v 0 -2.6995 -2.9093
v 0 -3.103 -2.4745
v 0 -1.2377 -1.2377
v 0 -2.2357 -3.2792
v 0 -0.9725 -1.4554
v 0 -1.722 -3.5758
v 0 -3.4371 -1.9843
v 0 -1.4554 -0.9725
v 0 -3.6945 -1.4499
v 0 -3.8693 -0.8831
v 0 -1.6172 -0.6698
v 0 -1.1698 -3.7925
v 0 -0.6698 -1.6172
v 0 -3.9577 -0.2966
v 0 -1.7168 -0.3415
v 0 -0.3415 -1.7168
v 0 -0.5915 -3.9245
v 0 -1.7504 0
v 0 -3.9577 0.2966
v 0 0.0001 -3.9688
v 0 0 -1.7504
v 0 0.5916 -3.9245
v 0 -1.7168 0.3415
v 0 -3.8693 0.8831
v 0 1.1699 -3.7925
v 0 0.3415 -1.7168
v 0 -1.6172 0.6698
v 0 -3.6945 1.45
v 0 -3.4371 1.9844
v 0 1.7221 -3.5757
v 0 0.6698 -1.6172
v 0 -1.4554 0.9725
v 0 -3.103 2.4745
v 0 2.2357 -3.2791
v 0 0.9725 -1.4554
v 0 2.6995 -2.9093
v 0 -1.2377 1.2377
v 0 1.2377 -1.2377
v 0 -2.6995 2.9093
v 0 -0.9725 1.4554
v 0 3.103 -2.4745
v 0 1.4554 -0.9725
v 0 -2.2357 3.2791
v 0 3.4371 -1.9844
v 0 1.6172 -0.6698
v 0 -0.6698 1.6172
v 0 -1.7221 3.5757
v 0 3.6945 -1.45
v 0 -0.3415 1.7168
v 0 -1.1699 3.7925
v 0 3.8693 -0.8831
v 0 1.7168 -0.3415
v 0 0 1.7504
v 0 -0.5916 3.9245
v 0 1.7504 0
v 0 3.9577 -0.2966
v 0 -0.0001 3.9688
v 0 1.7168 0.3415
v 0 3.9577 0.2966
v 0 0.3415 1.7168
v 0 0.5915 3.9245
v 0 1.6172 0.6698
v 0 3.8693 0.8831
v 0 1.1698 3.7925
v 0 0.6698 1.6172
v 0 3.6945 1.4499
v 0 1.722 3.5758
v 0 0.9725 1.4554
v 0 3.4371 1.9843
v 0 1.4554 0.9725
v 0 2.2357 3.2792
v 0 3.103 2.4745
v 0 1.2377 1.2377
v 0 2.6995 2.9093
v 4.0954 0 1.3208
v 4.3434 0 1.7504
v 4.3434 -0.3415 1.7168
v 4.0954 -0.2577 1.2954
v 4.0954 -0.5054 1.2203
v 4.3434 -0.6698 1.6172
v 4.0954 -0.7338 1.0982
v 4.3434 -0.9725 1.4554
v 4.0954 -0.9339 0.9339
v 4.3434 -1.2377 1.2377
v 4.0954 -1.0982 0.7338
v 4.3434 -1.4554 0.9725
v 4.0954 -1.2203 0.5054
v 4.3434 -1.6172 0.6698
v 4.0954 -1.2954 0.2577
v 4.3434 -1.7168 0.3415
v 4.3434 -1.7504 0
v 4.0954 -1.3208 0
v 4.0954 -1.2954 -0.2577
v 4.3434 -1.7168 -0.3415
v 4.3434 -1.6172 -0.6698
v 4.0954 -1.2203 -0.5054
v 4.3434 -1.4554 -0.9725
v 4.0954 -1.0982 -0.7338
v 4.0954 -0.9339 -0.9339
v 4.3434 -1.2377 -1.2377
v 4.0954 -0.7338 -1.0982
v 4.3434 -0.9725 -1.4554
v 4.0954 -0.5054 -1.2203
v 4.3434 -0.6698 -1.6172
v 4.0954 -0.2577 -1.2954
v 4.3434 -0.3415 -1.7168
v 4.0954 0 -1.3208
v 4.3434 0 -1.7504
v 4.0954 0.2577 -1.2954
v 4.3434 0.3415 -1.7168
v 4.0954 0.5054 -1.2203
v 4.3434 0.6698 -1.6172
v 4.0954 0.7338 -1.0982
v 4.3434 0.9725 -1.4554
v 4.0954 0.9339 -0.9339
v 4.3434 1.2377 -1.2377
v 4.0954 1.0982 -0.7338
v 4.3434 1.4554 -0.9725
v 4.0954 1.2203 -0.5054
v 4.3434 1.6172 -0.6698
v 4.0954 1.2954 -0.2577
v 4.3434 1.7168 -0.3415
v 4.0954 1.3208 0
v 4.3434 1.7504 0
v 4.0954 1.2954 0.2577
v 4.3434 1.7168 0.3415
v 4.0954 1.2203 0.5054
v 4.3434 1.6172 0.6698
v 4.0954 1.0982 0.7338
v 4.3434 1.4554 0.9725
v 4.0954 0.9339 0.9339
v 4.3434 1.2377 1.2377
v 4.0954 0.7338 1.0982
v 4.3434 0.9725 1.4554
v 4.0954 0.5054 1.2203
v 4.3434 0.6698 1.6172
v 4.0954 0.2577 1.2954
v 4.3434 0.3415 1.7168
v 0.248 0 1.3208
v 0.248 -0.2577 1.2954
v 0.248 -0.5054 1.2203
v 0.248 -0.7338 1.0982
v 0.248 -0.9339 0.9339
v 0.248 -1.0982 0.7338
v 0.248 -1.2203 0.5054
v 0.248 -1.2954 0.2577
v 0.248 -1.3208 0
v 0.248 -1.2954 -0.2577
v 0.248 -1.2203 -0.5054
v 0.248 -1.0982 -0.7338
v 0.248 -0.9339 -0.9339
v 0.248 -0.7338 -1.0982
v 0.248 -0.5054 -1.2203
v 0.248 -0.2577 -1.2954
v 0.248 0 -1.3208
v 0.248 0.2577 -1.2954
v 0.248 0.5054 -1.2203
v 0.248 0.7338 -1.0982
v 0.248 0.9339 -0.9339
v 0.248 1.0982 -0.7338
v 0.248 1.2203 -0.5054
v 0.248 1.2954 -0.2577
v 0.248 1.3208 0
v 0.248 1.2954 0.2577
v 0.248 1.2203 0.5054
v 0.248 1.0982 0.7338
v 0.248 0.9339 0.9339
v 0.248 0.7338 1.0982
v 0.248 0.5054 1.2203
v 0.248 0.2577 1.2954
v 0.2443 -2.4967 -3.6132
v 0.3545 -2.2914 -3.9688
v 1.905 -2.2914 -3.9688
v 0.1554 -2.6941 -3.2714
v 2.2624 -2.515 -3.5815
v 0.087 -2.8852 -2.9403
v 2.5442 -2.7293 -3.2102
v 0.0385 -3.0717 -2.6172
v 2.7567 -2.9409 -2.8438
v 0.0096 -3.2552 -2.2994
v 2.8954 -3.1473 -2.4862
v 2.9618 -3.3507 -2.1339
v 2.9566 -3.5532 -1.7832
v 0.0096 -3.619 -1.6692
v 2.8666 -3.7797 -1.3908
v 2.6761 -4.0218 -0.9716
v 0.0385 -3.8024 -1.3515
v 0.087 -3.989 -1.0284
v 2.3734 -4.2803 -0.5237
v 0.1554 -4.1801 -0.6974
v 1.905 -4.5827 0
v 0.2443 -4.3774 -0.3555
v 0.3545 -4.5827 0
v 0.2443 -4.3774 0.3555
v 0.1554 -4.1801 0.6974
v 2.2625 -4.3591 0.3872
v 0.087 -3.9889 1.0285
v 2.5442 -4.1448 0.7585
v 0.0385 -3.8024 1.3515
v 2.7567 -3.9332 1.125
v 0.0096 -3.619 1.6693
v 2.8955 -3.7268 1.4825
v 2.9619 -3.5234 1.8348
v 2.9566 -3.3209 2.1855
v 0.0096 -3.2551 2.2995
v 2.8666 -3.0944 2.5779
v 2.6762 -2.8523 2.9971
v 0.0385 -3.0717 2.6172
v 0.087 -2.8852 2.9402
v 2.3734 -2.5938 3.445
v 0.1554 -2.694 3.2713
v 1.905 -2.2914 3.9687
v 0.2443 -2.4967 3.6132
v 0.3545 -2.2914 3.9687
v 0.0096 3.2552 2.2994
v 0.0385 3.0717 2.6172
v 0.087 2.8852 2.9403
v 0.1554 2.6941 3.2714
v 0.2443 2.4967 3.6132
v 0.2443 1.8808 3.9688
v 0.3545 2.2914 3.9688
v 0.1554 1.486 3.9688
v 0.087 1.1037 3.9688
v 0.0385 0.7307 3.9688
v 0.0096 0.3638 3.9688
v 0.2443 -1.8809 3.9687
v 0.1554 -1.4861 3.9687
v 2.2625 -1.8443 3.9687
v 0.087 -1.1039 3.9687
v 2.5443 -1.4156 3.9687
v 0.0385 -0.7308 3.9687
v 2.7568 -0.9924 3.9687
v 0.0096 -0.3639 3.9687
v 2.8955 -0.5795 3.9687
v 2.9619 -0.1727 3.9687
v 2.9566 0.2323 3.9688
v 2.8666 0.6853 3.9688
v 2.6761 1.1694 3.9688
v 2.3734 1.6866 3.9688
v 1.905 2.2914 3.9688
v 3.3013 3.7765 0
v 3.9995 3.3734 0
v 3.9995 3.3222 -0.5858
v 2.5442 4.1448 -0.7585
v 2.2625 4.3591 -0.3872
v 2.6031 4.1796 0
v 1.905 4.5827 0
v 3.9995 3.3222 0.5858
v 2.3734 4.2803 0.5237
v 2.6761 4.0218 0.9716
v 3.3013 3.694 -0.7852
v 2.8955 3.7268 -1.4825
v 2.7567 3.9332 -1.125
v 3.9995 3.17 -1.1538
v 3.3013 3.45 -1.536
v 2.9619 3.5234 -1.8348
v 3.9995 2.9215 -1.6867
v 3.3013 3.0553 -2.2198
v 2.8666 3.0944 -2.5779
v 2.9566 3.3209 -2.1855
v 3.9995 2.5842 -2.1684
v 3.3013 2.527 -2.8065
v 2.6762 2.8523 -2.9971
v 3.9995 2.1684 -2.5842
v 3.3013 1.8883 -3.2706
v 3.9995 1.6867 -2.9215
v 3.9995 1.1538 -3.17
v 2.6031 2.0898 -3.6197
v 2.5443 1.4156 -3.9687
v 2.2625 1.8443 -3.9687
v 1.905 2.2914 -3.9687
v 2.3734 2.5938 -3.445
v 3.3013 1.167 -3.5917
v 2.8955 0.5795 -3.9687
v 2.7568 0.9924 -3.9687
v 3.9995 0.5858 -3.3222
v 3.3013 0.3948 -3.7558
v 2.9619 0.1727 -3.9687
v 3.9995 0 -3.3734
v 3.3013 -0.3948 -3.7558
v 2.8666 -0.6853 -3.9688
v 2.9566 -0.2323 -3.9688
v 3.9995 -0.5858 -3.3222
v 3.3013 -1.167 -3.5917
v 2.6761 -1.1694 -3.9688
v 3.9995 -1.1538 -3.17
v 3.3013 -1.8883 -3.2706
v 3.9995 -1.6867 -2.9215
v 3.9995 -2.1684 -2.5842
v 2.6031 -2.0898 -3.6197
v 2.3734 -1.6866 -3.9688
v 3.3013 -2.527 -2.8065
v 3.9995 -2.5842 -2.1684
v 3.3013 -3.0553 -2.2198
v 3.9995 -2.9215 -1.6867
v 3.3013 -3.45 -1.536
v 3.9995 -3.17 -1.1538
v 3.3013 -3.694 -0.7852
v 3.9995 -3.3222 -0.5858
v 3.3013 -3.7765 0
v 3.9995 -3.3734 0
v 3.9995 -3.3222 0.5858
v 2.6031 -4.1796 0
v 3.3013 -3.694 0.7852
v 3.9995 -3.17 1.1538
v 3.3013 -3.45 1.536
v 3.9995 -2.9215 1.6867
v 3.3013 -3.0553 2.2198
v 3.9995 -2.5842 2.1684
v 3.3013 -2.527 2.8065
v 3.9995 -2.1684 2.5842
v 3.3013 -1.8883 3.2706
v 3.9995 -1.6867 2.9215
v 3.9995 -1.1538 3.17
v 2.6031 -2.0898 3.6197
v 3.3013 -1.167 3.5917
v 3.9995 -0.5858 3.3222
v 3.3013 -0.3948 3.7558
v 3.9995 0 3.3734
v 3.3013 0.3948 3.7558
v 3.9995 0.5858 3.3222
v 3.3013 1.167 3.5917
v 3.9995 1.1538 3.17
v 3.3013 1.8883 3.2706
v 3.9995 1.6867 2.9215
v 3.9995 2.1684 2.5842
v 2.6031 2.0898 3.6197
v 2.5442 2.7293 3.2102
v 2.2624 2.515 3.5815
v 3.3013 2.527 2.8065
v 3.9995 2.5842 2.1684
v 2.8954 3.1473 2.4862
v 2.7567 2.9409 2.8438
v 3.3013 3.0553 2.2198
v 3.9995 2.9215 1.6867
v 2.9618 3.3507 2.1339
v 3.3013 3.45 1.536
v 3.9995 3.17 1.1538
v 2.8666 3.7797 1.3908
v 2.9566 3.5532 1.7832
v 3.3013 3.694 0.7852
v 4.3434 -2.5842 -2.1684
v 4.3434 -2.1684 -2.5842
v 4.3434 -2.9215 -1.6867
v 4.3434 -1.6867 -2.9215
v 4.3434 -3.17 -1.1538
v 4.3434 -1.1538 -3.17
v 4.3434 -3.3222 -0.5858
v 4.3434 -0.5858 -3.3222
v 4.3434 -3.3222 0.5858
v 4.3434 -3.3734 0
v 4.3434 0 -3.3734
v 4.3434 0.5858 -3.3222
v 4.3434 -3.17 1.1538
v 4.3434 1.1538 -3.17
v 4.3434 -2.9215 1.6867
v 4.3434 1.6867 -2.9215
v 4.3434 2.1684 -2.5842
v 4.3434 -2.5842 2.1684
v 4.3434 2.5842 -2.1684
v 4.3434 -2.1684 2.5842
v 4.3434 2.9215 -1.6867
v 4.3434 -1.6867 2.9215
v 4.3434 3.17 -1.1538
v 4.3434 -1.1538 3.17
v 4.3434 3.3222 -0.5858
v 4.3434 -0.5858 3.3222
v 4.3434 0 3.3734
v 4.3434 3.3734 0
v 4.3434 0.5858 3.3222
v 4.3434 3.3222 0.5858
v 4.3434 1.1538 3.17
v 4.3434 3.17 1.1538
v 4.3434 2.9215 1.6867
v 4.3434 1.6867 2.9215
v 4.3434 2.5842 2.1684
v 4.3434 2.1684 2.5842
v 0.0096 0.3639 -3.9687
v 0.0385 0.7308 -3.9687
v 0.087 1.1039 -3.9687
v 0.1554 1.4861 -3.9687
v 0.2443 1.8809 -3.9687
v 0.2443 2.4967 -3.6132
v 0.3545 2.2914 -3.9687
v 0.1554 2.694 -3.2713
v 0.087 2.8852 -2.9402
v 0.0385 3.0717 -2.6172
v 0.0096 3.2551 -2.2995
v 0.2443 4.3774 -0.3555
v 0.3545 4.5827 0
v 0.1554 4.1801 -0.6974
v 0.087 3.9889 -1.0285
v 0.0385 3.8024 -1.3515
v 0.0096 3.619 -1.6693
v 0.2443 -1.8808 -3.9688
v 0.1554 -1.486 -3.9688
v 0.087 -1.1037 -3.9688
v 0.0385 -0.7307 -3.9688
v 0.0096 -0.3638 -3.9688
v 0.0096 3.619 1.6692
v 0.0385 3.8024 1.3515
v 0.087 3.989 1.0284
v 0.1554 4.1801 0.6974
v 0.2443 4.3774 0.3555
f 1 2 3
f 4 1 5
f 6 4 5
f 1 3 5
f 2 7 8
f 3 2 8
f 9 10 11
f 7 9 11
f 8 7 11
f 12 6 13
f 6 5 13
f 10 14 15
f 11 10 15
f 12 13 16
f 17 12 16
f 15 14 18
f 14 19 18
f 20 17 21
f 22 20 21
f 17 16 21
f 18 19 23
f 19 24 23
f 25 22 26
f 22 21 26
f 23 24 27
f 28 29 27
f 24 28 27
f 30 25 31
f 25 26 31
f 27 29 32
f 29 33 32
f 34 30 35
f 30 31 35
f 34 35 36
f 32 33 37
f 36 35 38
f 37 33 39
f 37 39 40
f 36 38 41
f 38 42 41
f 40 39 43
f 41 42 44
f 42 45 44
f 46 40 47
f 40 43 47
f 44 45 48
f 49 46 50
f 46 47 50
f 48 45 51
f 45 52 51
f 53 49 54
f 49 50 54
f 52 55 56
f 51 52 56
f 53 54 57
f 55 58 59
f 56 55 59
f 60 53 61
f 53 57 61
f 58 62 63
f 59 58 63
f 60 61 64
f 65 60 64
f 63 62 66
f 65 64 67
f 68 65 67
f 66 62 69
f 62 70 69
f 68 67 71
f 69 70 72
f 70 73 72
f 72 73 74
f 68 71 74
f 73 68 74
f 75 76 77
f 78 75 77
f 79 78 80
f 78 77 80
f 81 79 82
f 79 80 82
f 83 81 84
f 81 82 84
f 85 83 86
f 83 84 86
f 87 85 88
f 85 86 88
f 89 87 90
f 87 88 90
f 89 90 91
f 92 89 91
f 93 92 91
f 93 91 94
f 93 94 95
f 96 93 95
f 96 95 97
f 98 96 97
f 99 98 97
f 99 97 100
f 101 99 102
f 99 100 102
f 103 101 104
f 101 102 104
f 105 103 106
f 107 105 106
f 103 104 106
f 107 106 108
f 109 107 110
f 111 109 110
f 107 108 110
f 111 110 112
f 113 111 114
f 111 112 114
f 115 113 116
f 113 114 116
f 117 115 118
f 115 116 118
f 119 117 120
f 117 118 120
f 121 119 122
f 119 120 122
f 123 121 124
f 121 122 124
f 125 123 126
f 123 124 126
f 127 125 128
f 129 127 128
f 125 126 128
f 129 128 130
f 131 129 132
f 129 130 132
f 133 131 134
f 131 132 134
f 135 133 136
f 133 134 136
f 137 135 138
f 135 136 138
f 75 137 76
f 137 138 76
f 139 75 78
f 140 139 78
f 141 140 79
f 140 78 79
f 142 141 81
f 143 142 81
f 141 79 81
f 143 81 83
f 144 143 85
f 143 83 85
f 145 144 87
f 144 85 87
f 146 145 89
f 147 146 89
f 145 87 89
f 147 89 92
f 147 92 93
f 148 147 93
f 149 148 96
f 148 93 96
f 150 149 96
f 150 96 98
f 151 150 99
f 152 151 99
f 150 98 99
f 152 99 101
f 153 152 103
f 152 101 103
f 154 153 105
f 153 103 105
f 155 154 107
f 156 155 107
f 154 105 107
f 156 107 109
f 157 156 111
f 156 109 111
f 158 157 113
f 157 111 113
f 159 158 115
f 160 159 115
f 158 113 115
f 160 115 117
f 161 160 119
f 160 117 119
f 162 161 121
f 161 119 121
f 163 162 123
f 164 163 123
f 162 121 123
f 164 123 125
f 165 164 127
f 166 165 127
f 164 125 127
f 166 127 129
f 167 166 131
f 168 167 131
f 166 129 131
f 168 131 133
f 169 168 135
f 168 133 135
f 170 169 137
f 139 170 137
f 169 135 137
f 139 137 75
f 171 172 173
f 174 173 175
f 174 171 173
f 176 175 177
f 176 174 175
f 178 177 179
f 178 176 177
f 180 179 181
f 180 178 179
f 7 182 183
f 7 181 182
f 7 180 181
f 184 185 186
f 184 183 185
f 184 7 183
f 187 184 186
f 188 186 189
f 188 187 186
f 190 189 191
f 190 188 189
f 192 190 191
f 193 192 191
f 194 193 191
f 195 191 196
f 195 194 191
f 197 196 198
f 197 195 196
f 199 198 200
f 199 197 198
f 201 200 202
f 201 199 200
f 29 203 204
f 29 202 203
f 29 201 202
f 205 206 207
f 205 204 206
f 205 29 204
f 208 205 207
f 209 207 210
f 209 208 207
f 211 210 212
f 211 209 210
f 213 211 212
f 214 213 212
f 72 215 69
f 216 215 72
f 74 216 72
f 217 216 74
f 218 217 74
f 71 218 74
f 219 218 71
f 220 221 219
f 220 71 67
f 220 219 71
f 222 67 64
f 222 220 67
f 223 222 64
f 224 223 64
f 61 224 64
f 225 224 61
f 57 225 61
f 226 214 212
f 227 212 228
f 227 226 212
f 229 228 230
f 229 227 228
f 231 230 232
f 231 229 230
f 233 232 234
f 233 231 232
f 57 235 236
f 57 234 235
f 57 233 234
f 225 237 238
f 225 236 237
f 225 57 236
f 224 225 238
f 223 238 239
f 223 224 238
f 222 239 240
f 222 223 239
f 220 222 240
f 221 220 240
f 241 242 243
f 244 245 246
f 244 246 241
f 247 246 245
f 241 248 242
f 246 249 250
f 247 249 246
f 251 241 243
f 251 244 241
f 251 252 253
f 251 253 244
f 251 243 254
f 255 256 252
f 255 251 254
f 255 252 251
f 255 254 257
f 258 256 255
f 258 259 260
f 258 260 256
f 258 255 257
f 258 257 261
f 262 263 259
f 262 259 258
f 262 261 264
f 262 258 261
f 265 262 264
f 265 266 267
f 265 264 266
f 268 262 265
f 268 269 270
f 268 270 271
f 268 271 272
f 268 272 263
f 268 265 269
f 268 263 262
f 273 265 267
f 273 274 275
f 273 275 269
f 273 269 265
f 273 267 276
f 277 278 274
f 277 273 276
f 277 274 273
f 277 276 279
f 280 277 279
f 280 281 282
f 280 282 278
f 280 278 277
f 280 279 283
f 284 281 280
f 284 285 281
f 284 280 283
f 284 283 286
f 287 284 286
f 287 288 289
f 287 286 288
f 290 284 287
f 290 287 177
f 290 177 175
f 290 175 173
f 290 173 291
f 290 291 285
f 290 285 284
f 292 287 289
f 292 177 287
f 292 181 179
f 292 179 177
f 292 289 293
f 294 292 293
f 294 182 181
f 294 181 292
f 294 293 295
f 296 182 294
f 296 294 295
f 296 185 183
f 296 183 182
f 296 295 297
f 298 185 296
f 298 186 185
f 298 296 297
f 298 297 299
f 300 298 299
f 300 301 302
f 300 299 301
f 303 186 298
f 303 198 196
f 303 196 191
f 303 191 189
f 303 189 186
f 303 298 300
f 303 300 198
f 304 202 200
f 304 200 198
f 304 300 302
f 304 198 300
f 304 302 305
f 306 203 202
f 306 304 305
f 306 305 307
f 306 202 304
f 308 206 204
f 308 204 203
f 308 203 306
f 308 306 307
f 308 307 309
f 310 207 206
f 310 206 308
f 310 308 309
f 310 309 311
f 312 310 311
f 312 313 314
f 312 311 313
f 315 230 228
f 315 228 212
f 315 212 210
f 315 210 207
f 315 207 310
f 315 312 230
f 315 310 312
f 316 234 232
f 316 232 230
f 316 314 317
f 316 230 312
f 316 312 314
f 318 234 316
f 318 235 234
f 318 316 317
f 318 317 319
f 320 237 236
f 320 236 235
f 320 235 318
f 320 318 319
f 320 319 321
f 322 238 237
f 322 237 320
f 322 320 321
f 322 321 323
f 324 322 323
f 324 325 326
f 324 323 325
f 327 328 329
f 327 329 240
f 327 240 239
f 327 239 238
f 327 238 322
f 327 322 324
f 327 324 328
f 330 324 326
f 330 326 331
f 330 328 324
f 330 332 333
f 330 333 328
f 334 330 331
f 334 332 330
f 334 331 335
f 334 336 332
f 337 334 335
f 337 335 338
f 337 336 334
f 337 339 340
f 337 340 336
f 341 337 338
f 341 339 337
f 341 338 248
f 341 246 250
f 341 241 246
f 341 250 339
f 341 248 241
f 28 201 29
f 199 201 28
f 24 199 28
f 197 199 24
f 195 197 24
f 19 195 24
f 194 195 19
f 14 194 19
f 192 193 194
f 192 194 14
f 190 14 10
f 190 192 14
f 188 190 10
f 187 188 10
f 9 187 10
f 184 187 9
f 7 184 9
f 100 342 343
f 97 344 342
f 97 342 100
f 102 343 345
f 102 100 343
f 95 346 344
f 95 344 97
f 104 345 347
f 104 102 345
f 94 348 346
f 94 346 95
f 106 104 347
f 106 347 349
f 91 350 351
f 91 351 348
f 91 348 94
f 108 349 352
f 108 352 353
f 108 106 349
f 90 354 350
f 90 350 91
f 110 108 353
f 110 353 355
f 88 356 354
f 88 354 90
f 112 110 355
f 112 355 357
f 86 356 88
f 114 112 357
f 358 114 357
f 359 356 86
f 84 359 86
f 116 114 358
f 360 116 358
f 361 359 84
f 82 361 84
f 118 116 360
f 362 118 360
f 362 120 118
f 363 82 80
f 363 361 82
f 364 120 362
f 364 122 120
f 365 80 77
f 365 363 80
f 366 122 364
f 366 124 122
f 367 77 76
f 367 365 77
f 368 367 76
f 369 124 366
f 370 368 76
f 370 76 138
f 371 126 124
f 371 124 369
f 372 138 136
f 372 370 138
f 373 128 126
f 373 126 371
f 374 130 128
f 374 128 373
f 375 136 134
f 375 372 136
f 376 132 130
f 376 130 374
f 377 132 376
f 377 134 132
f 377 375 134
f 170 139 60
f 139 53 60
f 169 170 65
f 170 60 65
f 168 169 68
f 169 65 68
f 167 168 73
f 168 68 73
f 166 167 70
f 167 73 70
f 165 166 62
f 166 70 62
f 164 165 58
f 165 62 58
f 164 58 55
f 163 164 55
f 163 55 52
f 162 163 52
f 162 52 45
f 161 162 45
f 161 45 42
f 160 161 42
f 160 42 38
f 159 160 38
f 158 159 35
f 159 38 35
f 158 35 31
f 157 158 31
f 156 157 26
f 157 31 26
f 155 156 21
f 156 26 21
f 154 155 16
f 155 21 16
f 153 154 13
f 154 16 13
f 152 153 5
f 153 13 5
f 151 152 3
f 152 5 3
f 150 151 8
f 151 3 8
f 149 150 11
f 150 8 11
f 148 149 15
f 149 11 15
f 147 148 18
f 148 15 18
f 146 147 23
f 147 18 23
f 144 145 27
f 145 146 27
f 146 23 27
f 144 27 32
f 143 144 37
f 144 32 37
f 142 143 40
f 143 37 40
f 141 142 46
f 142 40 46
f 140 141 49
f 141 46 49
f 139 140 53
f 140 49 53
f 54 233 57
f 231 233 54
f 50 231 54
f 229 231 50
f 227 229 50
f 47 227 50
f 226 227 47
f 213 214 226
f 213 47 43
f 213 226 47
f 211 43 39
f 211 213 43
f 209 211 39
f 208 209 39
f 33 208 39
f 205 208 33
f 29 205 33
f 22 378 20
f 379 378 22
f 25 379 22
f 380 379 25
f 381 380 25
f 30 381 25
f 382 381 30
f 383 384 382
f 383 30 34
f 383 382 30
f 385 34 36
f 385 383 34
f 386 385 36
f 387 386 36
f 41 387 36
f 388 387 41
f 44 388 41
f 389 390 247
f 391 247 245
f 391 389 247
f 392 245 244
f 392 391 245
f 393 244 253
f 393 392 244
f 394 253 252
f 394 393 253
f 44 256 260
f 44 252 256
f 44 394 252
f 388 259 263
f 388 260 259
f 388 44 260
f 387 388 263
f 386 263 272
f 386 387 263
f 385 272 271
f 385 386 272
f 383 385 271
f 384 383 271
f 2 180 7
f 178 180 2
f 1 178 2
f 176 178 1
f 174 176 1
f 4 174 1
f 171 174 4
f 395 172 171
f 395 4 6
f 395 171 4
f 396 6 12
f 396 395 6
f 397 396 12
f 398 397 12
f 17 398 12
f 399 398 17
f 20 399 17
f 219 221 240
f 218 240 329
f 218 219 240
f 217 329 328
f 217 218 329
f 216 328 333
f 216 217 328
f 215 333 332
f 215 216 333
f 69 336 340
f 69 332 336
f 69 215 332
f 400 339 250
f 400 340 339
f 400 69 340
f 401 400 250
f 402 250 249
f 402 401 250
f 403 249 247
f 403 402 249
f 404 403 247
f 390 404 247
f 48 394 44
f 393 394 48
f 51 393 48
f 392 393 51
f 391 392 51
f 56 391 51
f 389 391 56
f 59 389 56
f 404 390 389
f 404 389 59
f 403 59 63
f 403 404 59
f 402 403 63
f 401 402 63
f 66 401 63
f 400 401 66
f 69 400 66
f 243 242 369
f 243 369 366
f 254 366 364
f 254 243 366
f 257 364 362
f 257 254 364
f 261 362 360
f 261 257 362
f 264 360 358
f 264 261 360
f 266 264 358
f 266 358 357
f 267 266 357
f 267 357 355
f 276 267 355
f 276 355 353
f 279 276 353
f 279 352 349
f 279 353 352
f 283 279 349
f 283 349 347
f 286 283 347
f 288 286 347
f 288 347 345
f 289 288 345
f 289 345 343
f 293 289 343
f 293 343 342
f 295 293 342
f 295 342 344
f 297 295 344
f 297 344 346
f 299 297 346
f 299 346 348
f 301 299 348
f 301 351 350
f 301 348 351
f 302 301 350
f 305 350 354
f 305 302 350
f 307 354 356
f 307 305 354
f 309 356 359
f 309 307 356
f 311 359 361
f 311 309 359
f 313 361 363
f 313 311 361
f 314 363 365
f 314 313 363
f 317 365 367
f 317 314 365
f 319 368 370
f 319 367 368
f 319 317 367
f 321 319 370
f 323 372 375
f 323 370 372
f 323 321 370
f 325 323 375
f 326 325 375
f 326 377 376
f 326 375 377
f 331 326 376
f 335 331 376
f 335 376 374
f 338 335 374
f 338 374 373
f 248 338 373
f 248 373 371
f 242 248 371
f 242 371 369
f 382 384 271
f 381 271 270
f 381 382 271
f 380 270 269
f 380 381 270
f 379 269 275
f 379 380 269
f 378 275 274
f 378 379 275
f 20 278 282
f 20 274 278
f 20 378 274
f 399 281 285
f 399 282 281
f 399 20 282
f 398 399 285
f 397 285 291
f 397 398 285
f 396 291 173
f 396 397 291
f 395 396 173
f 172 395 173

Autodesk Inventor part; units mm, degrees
ref_plane "YZ Plane" through (0, 0, 0) normal (1, 0, 0) x (0, 1, 0)
ref_plane "XZ Plane" through (0, 0, 0) normal (0, 1, 0) x (-1, 0, 0)
sketch "Sketch1" plane through (0, 0, 0) normal (1, 0, 0) x (0, 1, 0)
  line L0 (-4.5827, 0) -> (-2.2914, 3.9687)
  line L1 (-2.2914, 3.9687) -> (2.2914, 3.9688)
  line L2 (2.2914, 3.9688) -> (4.5827, 0)
  line L3 (4.5827, 0) -> (2.2914, -3.9687)
  line L4 (2.2914, -3.9687) -> (-2.2914, -3.9688)
  line L5 (-2.2914, -3.9688) -> (-4.5827, 0)
  point P0 (0, 0)
  point P1 (0, 0)
  dimension "d0" = 9.1654
extrude "Body" add sketch "Sketch1" along normal blind 4.3434
sketch "Sketch2" plane through (0, 0, 0) normal (-1, 0, 0) x (0, 0, 1)
  line L0 (0, -6.4158) -> (0, 6.4158) projected
  line L1 (-5.5563, 0) -> (5.5563, 0) projected
  point P0 (0, 0)
hole "Thread" at (0, 0, 0) direction (1, 0, 0) diameter 2.6416 end through all thread size "6-32 UNC" class "2B" standard "ANSI Unified Screw Threads"
chamfer "Chamfer1" distance 0.4296 angle 30 1 edges at (0, 0, -1.3208) measured on face at (0, -2.6537, -1.573)
chamfer "Chamfer2" distance 0.4296 angle 30 1 edges at (4.3434, 0, -1.3208) measured on face at (4.3434, -2.6537, -1.573)
sketch "Sketch3" plane through (0, 0, 0) normal (0, 0, 1) x (1, 0, 0)
  line L0 (0, 2.2914) -> (0, 4.5827) projected
  line L1 (0, 4.5827) -> (4.3434, 4.5827) projected
  line L2 (4.3434, 2.2914) -> (4.3434, 4.5827) projected
  line L3 (-0.8687, 0) -> (5.2121, 0) projected
  line L4 (0.3545, 4.5827) -> (0, 3.9688)
  line L5 (4.3434, 3.3734) -> (3.9995, 3.3734)
  line L6 (3.9995, 3.3734) -> (1.905, 4.5827)
  dimension "d3" = 30
  dimension "d5" = 7.9375
  dimension "d6" = 6.7469
  dimension "d8" = 60
  dimension "d9" = 1.905
revolve "Chamfer3" cut sketch "Sketch3" angle 360 about axis through (-10, 0, 0) along (1, 0, 0)
ref_plane "Work Plane1" through (12.8792, 0, 0) normal (0, 0, 1) x (-1, 0, 0)
equation "\"d0\" = 1.1547 * SW"
equation "\"d1\" = KOH"
equation "\"d3\" = ANG1"
equation "\"d5\" = SW0"
equation "\"d6\" = SW1"
equation "\"d8\" = ANG2"
equation "\"d9\" = KOH1"
equation "\"d10\" = -0.5 * GD1 + 0.5 * NND"
equation "\"d39\" = -0.5 * GD1 + 0.5 * NND"
equation "\"d12\" = -0.5 * GD1 + 0.5 * NND"
equation "\"d40\" = -0.5 * GD1 + 0.5 * NND"
equation "\"ANG1\" = 30deg"
equation "\"ANG2\" = 60deg"
equation "\"NND\" = 3.5052"
equation "\"KOH\" = 4.3434"
equation "\"SW\" = 7.9375"
equation "\"SW0\" = SW"
equation "\"SW1\" = 0.85 * SW"
equation "\"KOH1\" = 1.905"
equation "\"THREADDIA\" = 3.5052"
equation "\"TOA\" = 30deg"
equation "\"E0\" = 1.155 * SW"
equation "\"GD1\" = 2.64594"
properties part number "IFI 100/107 - No. 6 - 32 Metal Type" material "Steel, Mild"
